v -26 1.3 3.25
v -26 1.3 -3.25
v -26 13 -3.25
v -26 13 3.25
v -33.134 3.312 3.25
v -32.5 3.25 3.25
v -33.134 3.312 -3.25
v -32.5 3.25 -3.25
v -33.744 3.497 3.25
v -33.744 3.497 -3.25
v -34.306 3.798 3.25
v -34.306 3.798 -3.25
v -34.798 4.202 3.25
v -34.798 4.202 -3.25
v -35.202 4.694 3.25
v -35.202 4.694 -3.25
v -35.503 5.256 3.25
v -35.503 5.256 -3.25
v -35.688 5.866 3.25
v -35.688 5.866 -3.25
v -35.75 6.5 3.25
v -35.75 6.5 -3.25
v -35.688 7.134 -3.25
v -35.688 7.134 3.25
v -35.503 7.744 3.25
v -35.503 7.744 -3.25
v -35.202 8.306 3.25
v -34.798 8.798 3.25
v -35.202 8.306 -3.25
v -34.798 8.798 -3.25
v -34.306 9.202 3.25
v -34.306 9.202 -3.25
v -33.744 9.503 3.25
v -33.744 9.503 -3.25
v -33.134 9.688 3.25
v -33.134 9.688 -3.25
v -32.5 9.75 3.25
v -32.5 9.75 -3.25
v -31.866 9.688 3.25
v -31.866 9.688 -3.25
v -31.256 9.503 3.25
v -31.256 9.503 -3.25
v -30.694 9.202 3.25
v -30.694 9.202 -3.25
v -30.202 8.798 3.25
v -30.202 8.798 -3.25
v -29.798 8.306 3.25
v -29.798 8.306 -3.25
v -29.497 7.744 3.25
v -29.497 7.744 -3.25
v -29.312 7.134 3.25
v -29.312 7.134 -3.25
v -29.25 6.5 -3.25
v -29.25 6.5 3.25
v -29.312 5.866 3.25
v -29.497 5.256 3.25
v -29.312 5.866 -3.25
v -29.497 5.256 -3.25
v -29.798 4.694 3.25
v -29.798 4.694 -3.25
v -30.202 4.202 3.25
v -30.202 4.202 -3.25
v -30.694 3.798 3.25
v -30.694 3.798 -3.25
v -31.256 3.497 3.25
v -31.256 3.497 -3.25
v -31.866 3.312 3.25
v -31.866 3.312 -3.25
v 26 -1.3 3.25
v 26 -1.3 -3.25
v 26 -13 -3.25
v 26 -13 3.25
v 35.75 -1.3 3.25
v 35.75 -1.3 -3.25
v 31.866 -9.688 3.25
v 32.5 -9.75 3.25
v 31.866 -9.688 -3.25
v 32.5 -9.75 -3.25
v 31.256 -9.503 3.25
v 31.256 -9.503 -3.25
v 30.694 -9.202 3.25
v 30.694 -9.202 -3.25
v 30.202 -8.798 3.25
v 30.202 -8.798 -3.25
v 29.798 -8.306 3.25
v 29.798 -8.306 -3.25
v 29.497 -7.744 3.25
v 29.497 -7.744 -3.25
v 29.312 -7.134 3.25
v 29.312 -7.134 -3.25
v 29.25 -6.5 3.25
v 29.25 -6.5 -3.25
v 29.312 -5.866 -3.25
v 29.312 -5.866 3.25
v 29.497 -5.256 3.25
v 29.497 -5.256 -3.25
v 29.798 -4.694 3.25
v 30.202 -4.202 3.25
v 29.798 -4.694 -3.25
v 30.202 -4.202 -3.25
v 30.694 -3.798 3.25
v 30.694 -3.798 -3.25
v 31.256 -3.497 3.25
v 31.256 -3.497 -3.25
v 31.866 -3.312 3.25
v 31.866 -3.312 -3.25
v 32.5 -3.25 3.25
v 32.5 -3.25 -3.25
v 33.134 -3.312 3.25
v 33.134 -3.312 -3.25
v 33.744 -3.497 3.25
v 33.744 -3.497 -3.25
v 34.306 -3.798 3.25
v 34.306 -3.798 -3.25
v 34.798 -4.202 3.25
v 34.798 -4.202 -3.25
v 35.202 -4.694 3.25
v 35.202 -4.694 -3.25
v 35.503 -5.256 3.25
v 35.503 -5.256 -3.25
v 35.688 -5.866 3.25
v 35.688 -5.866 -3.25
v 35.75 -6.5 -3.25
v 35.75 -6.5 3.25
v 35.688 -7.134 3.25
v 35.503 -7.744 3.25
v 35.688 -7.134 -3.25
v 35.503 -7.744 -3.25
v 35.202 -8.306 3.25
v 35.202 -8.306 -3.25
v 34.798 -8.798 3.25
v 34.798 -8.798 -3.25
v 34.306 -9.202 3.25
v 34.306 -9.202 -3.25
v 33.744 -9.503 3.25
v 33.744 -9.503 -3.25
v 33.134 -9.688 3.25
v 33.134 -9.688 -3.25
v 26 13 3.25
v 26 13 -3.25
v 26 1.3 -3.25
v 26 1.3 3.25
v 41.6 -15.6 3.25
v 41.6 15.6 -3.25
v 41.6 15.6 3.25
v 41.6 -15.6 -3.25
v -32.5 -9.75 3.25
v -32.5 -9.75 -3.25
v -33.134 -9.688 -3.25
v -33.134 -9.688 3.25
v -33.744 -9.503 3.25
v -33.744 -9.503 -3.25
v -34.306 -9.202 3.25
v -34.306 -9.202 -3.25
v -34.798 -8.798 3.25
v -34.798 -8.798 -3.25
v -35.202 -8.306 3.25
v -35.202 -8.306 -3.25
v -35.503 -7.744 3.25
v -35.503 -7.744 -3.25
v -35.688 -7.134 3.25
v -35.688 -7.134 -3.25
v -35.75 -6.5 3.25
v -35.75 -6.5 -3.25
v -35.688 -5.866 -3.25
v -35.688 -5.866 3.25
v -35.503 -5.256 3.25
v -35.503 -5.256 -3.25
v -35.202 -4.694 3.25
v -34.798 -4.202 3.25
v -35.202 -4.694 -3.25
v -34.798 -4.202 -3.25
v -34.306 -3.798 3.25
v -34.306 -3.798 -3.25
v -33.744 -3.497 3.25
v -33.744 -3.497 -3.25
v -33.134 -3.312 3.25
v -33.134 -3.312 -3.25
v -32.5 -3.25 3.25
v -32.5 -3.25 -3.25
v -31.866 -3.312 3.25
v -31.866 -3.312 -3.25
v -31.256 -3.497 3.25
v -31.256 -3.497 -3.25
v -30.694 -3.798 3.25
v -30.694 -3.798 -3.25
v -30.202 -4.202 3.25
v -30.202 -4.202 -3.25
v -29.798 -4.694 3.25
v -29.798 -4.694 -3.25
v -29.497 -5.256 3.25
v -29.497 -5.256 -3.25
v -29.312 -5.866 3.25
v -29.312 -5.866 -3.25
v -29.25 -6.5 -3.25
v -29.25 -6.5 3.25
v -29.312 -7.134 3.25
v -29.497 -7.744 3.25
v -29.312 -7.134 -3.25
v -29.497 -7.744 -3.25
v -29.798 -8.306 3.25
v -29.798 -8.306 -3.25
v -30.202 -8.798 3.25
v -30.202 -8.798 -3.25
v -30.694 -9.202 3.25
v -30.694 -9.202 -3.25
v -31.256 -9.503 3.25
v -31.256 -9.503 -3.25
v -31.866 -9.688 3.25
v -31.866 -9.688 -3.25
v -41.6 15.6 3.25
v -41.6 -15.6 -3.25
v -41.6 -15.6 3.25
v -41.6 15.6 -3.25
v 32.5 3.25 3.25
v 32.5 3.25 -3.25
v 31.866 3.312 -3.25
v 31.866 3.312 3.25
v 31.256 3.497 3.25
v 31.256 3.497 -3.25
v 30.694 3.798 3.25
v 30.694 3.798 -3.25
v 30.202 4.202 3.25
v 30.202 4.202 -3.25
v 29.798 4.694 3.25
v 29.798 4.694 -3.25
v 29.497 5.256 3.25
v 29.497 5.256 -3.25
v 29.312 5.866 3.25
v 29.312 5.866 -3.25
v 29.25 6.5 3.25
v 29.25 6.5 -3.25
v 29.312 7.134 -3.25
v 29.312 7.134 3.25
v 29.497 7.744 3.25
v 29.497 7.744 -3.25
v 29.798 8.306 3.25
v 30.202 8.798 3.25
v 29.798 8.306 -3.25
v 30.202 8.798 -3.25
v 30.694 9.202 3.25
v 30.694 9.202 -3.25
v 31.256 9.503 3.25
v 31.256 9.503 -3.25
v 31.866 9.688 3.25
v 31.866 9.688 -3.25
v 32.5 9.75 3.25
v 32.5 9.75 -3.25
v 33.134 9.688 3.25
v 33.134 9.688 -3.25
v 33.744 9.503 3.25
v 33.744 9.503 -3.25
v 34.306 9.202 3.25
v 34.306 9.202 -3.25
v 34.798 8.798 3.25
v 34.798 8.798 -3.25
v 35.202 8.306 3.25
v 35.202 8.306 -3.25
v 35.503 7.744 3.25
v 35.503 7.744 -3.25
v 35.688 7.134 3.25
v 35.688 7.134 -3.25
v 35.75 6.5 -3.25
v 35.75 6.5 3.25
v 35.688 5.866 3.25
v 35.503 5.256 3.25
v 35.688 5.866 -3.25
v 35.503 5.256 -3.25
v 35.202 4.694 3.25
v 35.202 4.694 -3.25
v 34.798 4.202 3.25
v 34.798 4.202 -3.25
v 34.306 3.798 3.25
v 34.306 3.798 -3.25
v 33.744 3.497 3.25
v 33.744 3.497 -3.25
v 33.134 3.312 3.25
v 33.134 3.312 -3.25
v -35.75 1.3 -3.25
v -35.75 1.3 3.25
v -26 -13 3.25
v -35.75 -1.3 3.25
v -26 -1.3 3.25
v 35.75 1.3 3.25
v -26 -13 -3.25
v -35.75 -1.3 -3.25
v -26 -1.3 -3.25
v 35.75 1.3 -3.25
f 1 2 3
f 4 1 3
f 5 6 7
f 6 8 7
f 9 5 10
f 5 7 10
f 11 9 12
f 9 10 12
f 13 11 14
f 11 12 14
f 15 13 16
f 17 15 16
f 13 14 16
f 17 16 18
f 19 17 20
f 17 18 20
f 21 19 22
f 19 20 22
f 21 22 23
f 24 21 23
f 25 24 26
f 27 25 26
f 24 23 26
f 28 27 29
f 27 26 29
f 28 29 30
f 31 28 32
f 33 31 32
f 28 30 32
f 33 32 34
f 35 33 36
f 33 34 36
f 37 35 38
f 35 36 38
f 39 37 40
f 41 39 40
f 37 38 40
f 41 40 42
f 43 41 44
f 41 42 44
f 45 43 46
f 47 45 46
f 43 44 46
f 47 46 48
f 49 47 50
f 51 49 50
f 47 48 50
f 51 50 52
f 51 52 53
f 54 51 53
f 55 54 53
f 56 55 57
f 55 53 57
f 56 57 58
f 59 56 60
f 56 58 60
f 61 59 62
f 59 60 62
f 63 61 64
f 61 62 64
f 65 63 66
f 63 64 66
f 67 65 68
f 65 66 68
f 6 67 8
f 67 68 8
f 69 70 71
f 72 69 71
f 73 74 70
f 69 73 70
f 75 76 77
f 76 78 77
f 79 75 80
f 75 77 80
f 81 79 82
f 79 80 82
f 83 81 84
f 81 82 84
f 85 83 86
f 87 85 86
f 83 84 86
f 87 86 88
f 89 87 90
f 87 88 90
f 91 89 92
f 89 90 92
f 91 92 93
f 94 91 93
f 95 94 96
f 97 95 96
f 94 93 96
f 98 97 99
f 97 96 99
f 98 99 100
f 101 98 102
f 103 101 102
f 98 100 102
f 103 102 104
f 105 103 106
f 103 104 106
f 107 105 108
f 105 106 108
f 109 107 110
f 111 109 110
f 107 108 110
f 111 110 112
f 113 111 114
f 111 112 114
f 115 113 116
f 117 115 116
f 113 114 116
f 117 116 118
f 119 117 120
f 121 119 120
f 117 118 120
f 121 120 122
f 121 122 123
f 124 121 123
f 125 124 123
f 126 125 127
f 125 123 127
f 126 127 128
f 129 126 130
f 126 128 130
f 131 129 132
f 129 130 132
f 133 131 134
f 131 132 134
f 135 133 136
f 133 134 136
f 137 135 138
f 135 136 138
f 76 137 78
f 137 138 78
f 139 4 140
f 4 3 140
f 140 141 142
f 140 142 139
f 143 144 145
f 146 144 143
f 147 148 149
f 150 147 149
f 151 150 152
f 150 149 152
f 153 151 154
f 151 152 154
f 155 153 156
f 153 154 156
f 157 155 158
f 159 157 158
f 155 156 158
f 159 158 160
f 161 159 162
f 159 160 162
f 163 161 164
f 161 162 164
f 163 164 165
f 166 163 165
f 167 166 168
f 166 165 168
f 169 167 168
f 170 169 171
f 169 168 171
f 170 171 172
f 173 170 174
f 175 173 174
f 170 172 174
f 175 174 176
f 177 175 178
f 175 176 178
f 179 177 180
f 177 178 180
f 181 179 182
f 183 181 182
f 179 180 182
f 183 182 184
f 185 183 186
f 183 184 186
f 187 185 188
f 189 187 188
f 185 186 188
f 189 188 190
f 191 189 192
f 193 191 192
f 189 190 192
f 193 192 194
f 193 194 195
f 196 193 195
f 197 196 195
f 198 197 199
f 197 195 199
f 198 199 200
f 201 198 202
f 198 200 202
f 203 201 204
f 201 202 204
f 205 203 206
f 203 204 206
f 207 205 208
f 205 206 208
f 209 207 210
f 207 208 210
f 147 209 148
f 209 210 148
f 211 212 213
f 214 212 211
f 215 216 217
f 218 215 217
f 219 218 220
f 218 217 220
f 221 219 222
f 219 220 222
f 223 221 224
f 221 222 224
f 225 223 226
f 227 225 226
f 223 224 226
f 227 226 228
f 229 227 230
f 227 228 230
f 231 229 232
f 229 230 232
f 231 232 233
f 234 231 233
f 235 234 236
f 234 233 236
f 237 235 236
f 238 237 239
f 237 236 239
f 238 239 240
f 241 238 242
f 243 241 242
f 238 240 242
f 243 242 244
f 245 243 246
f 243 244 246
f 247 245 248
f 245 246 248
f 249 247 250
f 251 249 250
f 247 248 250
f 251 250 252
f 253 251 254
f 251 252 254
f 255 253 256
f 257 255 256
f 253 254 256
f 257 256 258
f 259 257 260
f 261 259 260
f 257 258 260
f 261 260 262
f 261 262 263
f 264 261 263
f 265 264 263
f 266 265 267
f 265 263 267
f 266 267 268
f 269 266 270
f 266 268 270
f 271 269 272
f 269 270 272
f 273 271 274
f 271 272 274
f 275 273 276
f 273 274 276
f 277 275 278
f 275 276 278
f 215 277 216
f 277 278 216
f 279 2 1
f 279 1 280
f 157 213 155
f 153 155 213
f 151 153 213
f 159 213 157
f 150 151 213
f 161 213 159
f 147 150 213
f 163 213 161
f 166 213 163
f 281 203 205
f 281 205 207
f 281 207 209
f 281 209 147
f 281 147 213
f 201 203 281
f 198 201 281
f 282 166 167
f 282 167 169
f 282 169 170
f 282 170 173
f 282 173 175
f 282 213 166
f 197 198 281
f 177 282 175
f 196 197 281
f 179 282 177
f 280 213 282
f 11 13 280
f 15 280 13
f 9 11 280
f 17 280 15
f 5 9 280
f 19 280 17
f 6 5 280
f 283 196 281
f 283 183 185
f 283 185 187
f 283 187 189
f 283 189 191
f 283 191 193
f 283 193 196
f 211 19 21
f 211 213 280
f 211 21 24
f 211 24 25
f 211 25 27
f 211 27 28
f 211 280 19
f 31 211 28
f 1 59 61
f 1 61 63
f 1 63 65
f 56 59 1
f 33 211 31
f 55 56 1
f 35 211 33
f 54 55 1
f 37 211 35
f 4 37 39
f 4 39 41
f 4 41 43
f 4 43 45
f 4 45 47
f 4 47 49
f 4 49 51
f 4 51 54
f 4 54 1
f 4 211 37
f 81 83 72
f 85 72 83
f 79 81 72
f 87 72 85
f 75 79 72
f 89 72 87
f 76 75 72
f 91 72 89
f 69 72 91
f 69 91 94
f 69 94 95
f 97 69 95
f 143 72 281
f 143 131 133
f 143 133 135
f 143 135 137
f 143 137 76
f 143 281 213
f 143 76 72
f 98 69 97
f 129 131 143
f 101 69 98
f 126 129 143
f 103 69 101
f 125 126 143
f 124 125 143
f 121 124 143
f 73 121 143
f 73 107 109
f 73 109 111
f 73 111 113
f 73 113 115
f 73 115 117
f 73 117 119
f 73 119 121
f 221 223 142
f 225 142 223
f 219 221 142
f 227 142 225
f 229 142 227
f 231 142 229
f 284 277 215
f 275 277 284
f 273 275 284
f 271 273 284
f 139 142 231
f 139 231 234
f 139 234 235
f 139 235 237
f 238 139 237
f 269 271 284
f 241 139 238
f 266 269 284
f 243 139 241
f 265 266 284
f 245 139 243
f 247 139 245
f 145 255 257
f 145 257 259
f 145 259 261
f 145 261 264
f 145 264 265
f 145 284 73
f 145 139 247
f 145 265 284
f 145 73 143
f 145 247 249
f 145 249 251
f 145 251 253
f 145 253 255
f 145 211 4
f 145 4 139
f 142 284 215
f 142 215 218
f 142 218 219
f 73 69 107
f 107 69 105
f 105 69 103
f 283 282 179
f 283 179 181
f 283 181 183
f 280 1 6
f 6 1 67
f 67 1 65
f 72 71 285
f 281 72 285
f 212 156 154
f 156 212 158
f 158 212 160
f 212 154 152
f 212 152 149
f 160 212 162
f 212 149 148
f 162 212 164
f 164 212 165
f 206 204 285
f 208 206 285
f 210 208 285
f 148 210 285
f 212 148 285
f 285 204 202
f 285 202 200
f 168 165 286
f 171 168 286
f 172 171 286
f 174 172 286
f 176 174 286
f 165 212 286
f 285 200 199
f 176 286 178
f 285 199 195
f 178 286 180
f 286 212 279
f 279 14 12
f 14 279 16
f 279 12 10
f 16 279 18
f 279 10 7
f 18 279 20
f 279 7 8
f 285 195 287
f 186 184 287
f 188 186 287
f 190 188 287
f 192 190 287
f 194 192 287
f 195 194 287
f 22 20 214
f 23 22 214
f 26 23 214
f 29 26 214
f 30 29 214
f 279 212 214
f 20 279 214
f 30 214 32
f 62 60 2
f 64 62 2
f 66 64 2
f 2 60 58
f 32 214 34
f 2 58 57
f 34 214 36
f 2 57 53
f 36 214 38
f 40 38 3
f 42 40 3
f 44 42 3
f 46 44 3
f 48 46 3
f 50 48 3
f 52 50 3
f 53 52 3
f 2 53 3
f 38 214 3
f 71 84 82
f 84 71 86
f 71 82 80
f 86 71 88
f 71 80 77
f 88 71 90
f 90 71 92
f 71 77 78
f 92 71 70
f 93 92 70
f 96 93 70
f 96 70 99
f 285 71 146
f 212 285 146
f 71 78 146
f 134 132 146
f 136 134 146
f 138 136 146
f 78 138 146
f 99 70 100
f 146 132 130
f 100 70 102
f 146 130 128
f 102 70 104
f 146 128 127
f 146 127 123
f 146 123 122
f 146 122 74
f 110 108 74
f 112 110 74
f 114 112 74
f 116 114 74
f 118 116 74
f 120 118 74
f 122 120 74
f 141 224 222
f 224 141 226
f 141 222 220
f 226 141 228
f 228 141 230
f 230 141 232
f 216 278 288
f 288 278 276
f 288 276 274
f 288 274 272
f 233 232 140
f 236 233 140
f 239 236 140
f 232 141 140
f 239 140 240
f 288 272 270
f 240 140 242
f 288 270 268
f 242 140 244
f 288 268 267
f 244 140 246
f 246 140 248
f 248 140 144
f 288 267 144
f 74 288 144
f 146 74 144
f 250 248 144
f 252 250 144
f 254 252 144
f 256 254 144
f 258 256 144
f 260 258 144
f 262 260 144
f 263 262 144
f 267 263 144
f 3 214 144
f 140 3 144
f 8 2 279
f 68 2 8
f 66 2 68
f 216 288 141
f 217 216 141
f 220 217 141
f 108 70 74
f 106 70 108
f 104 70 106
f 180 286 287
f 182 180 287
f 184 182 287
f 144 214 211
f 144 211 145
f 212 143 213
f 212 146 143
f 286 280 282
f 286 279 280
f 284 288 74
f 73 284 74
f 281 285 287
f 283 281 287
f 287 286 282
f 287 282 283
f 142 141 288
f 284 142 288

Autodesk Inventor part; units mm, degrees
ref_plane "YZ Plane" through (0, 0, 0) normal (1, 0, 0) x (0, 1, 0)
ref_plane "XZ Plane" through (0, 0, 0) normal (0, 1, 0) x (-1, 0, 0)
ref_plane "XY Plane" through (0, 0, 0) normal (0, 0, 1) x (1, 0, 0)
sketch "Sketch1" plane through (0, 0, 0) normal (0, 0, 1) x (1, 0, 0)
  line L0 (-26, 13) -> (26, 13)
  line L1 (26, -13) -> (-26, -13)
  line L2 (-26, 13) -> (26, -13) construction
  line L3 (26, 13) -> (-26, -13) construction
  line L4 (-41.6, 15.6) -> (41.6, 15.6)
  line L5 (41.6, 15.6) -> (41.6, -15.6)
  line L6 (41.6, -15.6) -> (-41.6, -15.6)
  line L7 (-41.6, -15.6) -> (-41.6, 15.6)
  line L8 (-41.6, 15.6) -> (41.6, -15.6) construction
  line L9 (41.6, 15.6) -> (-41.6, -15.6) construction
  line L10 (-26, 1.3) -> (-35.75, 1.3)
  line L11 (-35.75, 1.3) -> (-35.75, -1.3)
  line L12 (-35.75, -1.3) -> (-26, -1.3)
  line L13 (26, 1.3) -> (35.75, 1.3)
  line L14 (35.75, 1.3) -> (35.75, -1.3)
  line L15 (35.75, -1.3) -> (26, -1.3)
  line L16 (-26, 1.3) -> (-26, 13)
  line L17 (-26, -13) -> (-26, -1.3)
  line L18 (26, -1.3) -> (26, -13)
  line L19 (26, 1.3) -> (26, 13)
  point P0 (0, 0)
  point P1 (-35.75, 0)
  point P2 (0, 0)
  dimension "CInt" = 52
  dimension "LInt" = 26
  dimension "Cext" = 83.2
  dimension "Lext" = 31.2
  dimension "Cpeq" = 9.75
  dimension "Lpeq" = 2.6
  dimension "d10" = 9.75
  dimension "d11" = 2.6
extrude "Extrusion1" add sketch "Sketch1" along normal mid plane 6.5
sketch "Sketch8" plane through (0, 0, 3.25) normal (0, 0, 1) x (1, 0, 0)
  point P0 (0, 0)
hole "Hole1" at (-32.5, 6.5, 3.25) direction (0, 0, -1) diameter 6.5 end through all
pattern_linear "Rectangular Pattern1" count 2 spacing 13 along (0, -1, 0) of "Hole1"
hole "Hole2" at (32.5, 6.5, 3.25) direction (0, 0, -1) diameter 6.5 end through all
pattern_linear "Rectangular Pattern2" count 2 spacing 13 along (0, -1, 0) of "Hole2"
properties part number "DandoBom"
